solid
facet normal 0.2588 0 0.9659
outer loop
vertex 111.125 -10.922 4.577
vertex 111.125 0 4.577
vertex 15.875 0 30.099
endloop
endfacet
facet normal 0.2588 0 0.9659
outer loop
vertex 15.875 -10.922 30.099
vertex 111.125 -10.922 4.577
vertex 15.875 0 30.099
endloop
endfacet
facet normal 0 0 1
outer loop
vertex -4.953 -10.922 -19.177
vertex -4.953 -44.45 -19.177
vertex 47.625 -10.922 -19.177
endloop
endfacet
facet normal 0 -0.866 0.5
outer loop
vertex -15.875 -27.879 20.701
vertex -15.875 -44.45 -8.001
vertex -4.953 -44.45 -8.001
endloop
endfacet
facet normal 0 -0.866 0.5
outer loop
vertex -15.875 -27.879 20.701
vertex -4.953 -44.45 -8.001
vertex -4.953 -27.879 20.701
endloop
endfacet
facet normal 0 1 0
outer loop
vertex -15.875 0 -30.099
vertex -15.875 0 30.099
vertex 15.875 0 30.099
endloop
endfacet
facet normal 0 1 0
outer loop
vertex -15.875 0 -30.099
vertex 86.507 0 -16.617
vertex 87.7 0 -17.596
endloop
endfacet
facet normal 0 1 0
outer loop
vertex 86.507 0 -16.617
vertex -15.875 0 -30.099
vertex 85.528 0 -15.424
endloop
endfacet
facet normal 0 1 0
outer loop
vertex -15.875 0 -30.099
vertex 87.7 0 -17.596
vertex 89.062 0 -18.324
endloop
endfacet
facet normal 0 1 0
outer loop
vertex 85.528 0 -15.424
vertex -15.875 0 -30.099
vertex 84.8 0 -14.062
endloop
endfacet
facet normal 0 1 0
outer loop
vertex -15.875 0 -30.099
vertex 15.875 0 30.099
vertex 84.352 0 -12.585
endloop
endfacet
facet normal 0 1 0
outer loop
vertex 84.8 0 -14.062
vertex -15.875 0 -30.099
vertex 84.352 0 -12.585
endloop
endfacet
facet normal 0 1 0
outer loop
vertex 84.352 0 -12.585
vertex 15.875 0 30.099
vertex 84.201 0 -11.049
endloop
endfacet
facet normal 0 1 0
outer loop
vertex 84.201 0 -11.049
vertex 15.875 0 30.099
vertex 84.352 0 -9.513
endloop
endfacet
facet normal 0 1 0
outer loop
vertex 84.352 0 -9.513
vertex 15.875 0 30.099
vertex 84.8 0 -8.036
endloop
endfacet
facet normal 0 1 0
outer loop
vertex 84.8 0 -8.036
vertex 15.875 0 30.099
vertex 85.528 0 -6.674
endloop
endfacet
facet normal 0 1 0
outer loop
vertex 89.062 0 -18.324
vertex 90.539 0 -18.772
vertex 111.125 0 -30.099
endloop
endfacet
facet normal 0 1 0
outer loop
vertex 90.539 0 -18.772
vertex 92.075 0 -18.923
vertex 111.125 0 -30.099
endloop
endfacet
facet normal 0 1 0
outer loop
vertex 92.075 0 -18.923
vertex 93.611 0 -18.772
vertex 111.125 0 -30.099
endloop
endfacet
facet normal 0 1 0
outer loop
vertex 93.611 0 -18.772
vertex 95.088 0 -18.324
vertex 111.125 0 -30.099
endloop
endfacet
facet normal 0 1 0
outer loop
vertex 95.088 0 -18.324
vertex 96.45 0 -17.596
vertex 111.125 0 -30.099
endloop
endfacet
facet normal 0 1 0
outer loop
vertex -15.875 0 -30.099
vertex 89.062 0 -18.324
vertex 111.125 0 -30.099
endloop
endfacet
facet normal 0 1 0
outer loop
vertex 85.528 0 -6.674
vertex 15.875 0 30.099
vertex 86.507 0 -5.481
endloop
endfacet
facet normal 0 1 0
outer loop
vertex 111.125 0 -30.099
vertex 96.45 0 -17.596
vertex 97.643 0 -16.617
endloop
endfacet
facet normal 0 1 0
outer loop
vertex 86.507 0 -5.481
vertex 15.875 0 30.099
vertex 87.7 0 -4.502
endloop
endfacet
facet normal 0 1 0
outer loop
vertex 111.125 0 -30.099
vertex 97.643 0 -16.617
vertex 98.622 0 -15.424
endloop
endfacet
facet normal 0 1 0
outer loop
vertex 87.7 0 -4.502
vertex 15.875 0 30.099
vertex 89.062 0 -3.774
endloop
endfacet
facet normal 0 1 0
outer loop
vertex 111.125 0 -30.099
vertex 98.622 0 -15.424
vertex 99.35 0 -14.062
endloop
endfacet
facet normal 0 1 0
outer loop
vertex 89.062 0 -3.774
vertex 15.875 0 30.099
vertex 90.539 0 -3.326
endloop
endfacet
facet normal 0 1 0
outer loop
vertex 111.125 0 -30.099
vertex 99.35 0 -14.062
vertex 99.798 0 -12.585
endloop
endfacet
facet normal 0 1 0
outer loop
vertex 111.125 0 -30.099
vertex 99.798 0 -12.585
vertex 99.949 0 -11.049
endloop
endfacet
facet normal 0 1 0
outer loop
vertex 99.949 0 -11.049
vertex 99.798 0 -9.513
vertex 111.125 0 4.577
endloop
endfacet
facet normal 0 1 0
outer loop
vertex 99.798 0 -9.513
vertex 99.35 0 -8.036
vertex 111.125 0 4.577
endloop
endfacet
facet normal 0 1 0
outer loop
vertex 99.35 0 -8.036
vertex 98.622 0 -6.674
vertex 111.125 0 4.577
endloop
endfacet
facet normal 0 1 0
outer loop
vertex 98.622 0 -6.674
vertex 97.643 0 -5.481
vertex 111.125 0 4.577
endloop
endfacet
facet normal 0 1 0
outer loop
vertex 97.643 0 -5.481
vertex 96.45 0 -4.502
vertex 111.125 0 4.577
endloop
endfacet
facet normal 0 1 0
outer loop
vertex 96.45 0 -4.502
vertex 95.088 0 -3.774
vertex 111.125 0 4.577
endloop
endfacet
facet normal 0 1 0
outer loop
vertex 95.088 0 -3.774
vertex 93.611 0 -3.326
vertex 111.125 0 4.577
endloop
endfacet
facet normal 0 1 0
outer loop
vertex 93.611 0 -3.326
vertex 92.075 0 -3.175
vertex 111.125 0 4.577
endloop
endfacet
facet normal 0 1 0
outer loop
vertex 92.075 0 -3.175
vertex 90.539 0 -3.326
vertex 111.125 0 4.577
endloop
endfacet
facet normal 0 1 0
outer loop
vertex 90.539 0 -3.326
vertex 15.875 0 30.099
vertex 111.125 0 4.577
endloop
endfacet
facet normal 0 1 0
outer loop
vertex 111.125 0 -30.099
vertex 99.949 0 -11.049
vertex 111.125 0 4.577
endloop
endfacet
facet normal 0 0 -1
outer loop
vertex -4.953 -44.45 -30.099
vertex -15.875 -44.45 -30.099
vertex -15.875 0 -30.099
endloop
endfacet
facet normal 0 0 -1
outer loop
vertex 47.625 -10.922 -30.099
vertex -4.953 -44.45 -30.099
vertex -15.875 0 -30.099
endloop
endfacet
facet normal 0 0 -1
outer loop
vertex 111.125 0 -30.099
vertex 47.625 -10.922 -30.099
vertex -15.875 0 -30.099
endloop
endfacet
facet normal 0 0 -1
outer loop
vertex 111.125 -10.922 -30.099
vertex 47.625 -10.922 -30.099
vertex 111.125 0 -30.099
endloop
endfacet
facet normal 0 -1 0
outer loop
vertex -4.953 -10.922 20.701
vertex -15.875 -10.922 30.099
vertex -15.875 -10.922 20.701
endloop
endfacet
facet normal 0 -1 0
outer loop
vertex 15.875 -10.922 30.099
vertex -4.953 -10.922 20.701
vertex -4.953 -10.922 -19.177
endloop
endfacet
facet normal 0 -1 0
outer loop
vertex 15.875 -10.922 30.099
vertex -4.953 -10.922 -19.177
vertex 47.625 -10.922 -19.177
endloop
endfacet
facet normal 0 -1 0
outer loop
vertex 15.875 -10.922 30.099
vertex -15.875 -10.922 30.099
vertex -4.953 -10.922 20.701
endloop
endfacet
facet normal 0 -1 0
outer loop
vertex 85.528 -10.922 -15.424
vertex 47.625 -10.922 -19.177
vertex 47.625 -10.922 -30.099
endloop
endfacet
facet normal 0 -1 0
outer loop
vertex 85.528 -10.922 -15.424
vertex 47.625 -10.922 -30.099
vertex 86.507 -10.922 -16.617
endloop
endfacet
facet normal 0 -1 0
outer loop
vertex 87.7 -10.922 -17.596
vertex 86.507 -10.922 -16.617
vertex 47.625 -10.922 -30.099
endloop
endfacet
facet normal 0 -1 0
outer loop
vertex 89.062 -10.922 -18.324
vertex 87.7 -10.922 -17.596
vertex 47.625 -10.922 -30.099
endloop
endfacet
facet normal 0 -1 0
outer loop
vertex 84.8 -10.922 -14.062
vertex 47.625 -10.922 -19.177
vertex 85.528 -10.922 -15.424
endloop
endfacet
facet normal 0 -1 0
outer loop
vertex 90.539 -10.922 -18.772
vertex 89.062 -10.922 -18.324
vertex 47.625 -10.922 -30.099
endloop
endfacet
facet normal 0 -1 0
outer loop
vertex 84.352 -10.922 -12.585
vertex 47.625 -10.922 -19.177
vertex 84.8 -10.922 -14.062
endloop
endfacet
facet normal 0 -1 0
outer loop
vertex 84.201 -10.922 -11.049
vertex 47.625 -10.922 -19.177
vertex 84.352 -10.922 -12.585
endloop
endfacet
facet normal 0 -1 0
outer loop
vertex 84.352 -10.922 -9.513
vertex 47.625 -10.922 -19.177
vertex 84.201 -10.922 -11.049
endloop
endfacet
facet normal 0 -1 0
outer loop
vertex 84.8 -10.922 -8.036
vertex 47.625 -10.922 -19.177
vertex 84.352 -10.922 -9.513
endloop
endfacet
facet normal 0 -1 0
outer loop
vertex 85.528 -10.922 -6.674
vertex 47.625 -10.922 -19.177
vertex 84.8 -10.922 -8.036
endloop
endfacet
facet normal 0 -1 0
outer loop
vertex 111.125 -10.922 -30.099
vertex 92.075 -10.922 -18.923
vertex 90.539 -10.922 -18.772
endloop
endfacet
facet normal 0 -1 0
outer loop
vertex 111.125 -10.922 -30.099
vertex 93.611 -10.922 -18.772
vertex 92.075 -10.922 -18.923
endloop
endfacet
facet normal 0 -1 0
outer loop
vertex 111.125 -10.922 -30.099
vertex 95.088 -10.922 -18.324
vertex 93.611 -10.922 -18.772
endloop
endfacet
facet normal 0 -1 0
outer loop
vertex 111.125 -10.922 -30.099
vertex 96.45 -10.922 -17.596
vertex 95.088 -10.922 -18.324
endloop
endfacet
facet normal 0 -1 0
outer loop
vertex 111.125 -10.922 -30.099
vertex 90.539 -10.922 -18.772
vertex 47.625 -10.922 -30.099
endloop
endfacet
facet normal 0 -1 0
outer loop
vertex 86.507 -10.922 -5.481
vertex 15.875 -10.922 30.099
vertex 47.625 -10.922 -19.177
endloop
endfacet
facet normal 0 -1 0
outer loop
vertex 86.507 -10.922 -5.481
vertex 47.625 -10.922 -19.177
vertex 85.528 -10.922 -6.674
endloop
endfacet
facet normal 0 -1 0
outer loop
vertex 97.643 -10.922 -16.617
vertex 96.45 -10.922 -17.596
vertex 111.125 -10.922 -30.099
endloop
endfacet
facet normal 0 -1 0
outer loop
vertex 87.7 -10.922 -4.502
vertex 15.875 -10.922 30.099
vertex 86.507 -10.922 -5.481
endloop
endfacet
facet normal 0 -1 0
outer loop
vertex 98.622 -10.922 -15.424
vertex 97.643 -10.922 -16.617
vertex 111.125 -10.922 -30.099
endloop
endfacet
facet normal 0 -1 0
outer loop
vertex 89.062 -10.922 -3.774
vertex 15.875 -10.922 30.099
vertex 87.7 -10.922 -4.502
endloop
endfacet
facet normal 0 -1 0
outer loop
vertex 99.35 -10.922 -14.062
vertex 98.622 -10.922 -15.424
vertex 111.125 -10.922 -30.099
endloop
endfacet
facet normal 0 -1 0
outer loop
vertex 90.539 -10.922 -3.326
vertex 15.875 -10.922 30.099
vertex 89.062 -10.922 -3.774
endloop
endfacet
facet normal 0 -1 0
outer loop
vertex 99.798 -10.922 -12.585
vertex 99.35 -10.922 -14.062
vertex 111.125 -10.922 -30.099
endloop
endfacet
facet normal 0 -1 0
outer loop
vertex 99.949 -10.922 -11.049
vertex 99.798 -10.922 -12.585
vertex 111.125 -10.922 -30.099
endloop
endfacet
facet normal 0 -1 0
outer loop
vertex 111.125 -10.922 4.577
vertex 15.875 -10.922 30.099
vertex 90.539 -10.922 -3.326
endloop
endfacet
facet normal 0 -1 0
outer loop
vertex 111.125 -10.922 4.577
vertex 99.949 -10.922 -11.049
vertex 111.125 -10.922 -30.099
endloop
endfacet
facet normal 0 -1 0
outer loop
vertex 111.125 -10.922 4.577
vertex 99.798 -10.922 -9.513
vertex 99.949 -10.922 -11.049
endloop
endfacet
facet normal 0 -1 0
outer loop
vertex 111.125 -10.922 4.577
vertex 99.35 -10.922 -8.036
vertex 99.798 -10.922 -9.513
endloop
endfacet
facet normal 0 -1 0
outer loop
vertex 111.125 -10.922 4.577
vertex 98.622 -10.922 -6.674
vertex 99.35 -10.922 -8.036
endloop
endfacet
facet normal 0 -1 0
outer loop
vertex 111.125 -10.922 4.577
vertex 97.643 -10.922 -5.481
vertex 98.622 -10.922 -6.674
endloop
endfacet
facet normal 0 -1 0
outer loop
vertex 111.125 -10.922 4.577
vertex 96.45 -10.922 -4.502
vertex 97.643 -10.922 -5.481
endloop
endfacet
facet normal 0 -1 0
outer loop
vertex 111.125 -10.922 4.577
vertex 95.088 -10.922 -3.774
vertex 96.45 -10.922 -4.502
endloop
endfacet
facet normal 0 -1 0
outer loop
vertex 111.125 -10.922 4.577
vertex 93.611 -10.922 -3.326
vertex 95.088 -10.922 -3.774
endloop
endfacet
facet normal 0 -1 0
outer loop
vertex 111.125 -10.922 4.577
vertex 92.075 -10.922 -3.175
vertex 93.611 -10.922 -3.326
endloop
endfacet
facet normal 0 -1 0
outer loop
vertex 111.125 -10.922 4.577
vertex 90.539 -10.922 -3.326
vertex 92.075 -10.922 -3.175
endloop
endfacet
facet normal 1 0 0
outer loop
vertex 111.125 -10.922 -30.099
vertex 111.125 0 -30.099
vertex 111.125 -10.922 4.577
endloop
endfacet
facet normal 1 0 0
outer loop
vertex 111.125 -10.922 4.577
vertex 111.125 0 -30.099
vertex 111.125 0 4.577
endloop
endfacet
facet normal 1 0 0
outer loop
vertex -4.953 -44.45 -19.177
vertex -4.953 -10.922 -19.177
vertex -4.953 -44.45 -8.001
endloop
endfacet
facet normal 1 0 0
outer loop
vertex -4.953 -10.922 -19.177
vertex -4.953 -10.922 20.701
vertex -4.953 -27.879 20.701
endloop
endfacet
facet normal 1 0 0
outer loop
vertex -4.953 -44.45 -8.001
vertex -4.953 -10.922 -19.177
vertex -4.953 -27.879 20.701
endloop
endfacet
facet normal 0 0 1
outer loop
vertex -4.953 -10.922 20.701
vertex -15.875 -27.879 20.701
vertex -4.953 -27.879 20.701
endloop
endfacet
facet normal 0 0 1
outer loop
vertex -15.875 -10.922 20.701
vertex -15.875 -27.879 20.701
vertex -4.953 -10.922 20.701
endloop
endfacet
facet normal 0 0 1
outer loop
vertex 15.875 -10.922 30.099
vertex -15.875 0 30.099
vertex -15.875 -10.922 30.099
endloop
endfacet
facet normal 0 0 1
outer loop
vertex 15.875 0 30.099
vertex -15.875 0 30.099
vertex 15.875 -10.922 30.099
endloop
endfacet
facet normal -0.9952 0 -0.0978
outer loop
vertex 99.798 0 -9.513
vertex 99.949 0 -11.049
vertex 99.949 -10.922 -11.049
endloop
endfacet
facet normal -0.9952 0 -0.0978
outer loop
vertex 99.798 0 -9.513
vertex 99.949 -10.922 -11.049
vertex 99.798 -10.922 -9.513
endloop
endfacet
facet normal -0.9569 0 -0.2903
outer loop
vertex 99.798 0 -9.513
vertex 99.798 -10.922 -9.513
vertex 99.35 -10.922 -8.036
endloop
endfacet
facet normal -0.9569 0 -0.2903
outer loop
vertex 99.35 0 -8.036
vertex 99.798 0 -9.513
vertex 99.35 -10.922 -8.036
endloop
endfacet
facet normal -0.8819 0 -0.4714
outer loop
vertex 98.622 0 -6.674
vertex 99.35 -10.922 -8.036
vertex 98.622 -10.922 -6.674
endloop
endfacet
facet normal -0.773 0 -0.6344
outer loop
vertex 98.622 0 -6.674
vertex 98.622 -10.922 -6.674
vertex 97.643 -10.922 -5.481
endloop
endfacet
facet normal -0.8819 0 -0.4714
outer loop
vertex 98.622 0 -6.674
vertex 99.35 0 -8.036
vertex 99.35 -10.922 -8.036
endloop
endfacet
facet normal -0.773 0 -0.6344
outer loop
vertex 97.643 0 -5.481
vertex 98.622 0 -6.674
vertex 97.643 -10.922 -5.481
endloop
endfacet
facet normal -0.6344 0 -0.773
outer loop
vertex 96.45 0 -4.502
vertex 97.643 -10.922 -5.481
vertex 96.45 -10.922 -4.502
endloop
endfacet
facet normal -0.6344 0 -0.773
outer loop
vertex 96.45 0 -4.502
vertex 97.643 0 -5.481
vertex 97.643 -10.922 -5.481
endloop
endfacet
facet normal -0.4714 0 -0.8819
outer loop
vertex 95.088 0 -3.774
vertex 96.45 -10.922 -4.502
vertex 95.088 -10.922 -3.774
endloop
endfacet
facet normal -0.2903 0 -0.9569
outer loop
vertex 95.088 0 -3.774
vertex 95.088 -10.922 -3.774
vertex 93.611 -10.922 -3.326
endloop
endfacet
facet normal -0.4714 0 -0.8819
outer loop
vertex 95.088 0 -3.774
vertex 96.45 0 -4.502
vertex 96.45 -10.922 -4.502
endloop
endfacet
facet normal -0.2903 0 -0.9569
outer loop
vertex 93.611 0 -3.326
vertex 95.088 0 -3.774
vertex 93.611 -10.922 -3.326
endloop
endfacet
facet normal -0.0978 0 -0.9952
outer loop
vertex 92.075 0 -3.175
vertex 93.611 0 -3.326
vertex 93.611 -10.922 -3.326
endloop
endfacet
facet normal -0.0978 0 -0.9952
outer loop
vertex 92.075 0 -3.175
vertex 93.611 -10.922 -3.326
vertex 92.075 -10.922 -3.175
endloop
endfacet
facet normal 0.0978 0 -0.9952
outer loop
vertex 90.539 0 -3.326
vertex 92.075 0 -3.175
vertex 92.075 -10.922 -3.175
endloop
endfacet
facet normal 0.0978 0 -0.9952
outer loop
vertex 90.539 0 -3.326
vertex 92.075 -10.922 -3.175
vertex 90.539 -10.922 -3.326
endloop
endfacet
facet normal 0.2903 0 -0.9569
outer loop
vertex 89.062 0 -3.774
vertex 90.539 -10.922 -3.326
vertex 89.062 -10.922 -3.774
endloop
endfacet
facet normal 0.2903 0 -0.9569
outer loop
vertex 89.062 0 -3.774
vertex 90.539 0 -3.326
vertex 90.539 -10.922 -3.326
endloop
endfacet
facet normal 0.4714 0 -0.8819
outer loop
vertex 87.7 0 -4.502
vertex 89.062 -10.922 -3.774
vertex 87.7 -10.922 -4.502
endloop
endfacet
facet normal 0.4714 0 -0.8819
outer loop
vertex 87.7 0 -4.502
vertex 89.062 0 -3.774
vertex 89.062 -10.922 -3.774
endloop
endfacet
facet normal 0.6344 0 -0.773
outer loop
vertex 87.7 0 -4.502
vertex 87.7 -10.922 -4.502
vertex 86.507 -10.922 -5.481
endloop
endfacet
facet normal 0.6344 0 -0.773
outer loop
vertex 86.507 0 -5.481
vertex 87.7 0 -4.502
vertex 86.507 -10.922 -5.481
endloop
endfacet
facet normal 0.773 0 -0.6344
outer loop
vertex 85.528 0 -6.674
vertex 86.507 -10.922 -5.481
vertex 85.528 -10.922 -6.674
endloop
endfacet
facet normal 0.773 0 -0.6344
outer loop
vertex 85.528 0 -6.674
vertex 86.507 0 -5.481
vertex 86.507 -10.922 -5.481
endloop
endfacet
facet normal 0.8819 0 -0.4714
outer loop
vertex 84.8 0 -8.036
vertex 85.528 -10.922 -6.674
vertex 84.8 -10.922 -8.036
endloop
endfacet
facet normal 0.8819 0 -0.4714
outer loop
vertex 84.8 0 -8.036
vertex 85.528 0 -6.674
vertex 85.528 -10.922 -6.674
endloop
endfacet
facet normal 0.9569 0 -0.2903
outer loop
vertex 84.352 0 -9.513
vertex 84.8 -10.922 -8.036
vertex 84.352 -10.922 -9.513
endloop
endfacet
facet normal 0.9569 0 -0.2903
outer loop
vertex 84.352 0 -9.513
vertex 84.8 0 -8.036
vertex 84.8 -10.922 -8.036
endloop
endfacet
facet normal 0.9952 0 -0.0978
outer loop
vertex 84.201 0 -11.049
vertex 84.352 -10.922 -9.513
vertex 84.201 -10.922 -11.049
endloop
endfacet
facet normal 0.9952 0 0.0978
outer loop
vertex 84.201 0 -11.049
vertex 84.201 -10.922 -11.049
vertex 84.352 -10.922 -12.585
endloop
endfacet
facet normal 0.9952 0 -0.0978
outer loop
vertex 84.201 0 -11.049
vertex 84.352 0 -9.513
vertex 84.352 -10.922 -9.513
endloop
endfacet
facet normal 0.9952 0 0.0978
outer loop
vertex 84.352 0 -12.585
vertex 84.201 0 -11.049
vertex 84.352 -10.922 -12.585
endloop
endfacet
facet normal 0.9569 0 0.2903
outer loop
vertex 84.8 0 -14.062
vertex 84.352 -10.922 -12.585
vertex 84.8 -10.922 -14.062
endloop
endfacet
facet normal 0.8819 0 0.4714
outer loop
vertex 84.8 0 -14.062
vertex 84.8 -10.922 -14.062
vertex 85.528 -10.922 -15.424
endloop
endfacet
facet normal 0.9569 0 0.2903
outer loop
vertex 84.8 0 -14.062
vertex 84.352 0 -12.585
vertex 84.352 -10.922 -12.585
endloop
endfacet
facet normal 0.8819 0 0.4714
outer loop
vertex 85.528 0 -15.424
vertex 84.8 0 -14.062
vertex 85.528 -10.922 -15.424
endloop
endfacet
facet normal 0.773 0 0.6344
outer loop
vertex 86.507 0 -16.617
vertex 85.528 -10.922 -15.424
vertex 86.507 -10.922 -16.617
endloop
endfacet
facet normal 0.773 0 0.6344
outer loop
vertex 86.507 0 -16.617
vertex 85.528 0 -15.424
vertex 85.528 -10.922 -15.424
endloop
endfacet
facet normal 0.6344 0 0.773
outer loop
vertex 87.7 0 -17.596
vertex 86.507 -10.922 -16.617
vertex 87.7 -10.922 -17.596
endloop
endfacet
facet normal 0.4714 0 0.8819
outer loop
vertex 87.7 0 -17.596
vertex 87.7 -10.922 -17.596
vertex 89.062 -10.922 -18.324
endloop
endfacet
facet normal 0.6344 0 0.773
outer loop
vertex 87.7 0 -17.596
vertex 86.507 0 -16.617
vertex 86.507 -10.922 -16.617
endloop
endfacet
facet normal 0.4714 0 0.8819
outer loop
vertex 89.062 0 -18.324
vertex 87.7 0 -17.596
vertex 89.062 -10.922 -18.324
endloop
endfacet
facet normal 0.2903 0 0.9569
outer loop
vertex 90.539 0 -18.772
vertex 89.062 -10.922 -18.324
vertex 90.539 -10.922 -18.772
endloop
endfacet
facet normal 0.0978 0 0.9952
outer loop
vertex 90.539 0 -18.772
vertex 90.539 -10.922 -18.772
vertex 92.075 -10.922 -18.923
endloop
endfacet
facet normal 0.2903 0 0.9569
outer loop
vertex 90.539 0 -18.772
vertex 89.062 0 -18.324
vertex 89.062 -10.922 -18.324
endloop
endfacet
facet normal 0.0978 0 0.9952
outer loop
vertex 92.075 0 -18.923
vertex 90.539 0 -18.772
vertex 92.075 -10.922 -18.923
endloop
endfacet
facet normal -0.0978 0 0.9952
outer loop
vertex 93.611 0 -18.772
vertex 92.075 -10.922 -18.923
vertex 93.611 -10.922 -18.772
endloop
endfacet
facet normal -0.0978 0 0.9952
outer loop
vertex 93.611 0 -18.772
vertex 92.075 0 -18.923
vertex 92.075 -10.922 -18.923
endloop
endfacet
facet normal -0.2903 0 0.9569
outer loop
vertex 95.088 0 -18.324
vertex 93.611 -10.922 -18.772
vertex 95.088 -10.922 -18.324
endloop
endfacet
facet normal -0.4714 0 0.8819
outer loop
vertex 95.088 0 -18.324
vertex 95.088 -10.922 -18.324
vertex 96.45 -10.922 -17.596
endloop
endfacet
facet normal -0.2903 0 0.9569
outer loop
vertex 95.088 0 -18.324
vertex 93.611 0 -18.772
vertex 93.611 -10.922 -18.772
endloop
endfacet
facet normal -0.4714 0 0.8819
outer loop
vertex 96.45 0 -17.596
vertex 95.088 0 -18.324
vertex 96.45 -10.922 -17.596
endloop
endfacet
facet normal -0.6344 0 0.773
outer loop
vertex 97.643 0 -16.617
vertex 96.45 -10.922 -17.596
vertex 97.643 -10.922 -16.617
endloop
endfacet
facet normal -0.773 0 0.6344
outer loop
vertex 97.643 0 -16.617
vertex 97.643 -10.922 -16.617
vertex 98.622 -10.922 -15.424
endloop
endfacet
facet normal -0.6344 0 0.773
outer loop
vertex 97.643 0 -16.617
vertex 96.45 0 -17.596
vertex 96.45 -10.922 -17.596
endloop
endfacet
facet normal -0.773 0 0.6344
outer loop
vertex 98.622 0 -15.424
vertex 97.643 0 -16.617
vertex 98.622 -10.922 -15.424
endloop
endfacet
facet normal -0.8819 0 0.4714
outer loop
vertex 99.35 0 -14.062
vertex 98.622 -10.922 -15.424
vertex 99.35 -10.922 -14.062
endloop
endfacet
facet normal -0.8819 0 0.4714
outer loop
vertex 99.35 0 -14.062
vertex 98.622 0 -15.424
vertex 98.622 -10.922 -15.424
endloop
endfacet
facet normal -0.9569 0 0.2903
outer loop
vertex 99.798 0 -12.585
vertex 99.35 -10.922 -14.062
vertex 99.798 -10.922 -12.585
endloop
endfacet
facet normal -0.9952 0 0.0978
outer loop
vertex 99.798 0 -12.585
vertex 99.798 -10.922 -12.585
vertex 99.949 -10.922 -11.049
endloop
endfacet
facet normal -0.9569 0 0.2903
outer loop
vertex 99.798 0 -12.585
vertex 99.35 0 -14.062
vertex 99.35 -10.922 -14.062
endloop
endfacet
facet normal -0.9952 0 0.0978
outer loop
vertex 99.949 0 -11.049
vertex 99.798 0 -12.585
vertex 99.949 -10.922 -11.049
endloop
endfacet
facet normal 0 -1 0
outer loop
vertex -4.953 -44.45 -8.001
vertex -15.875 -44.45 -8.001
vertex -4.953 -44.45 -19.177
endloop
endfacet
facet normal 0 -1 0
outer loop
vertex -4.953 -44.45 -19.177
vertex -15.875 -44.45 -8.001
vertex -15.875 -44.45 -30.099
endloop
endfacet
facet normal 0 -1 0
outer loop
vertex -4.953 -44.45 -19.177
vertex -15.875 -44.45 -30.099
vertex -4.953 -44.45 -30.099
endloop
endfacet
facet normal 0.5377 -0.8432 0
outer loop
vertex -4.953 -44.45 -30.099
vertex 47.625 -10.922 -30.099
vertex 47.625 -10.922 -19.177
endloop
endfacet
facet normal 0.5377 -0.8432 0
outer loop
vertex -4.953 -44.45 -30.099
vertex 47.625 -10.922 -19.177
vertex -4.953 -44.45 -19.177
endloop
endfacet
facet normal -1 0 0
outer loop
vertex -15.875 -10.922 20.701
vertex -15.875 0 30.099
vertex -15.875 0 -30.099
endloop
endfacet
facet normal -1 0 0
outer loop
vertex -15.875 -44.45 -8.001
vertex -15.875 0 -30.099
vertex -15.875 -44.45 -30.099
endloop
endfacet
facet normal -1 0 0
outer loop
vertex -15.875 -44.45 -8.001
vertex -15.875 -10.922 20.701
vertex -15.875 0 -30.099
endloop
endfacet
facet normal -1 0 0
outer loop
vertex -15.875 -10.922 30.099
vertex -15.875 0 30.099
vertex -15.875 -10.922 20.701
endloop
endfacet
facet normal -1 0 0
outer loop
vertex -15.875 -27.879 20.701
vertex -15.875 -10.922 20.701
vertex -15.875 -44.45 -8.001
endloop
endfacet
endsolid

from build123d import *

# Parameters (mm, degrees)
F0_W     = 31.75
F0_H     = 60.198
F0_R     = 7.874
F1_DEPTH = 10.922
F3_DEPTH = 10.922
F2_W     = 10.922
F2_H     = 33.528
F4_DEPTH = 22.098
F6_DEPTH = 10.922


with BuildPart() as f1:
    # F0 (on Front) → F1 (new body)
    with BuildSketch(Plane.XZ):
        Rectangle(F0_W, F0_H)
        Polygon((111.125, 4.576839), (15.875, 30.099), (15.875, -30.099), (111.125, -30.099), align=None)
        with Locations((92.075, -11.049)):
            Circle(F0_R, mode=Mode.SUBTRACT)
    extrude(amount=F1_DEPTH)

    # F2 (on face) → F3 (join)
    with BuildSketch(Plane(origin=(0, 0, -30.099), x_dir=(1, 0, 0), z_dir=(0, 0, -1))):
        Polygon((-4.953, 44.45), (-4.953, 10.922), (47.625, 10.922), align=None)
    extrude(amount=-F3_DEPTH)

    # F2 (on face) → F4 (join)
    with BuildSketch(Plane(origin=(0, 0, -30.099), x_dir=(1, 0, 0), z_dir=(0, 0, -1))):
        with Locations((-10.414, 27.686)):
            Rectangle(F2_W, F2_H)
    extrude(amount=-F4_DEPTH)

    # F5 (on face) → F6 (join)
    with BuildSketch(Plane(origin=(-15.875, 0, 0), x_dir=(0, -1, 0), z_dir=(-1, 0, 0))):
        Polygon((10.922, -8.001), (44.45, -8.001), (27.878893, 20.701), (10.922, 20.701), align=None)
    extrude(amount=-F6_DEPTH)


solid = f1.part
